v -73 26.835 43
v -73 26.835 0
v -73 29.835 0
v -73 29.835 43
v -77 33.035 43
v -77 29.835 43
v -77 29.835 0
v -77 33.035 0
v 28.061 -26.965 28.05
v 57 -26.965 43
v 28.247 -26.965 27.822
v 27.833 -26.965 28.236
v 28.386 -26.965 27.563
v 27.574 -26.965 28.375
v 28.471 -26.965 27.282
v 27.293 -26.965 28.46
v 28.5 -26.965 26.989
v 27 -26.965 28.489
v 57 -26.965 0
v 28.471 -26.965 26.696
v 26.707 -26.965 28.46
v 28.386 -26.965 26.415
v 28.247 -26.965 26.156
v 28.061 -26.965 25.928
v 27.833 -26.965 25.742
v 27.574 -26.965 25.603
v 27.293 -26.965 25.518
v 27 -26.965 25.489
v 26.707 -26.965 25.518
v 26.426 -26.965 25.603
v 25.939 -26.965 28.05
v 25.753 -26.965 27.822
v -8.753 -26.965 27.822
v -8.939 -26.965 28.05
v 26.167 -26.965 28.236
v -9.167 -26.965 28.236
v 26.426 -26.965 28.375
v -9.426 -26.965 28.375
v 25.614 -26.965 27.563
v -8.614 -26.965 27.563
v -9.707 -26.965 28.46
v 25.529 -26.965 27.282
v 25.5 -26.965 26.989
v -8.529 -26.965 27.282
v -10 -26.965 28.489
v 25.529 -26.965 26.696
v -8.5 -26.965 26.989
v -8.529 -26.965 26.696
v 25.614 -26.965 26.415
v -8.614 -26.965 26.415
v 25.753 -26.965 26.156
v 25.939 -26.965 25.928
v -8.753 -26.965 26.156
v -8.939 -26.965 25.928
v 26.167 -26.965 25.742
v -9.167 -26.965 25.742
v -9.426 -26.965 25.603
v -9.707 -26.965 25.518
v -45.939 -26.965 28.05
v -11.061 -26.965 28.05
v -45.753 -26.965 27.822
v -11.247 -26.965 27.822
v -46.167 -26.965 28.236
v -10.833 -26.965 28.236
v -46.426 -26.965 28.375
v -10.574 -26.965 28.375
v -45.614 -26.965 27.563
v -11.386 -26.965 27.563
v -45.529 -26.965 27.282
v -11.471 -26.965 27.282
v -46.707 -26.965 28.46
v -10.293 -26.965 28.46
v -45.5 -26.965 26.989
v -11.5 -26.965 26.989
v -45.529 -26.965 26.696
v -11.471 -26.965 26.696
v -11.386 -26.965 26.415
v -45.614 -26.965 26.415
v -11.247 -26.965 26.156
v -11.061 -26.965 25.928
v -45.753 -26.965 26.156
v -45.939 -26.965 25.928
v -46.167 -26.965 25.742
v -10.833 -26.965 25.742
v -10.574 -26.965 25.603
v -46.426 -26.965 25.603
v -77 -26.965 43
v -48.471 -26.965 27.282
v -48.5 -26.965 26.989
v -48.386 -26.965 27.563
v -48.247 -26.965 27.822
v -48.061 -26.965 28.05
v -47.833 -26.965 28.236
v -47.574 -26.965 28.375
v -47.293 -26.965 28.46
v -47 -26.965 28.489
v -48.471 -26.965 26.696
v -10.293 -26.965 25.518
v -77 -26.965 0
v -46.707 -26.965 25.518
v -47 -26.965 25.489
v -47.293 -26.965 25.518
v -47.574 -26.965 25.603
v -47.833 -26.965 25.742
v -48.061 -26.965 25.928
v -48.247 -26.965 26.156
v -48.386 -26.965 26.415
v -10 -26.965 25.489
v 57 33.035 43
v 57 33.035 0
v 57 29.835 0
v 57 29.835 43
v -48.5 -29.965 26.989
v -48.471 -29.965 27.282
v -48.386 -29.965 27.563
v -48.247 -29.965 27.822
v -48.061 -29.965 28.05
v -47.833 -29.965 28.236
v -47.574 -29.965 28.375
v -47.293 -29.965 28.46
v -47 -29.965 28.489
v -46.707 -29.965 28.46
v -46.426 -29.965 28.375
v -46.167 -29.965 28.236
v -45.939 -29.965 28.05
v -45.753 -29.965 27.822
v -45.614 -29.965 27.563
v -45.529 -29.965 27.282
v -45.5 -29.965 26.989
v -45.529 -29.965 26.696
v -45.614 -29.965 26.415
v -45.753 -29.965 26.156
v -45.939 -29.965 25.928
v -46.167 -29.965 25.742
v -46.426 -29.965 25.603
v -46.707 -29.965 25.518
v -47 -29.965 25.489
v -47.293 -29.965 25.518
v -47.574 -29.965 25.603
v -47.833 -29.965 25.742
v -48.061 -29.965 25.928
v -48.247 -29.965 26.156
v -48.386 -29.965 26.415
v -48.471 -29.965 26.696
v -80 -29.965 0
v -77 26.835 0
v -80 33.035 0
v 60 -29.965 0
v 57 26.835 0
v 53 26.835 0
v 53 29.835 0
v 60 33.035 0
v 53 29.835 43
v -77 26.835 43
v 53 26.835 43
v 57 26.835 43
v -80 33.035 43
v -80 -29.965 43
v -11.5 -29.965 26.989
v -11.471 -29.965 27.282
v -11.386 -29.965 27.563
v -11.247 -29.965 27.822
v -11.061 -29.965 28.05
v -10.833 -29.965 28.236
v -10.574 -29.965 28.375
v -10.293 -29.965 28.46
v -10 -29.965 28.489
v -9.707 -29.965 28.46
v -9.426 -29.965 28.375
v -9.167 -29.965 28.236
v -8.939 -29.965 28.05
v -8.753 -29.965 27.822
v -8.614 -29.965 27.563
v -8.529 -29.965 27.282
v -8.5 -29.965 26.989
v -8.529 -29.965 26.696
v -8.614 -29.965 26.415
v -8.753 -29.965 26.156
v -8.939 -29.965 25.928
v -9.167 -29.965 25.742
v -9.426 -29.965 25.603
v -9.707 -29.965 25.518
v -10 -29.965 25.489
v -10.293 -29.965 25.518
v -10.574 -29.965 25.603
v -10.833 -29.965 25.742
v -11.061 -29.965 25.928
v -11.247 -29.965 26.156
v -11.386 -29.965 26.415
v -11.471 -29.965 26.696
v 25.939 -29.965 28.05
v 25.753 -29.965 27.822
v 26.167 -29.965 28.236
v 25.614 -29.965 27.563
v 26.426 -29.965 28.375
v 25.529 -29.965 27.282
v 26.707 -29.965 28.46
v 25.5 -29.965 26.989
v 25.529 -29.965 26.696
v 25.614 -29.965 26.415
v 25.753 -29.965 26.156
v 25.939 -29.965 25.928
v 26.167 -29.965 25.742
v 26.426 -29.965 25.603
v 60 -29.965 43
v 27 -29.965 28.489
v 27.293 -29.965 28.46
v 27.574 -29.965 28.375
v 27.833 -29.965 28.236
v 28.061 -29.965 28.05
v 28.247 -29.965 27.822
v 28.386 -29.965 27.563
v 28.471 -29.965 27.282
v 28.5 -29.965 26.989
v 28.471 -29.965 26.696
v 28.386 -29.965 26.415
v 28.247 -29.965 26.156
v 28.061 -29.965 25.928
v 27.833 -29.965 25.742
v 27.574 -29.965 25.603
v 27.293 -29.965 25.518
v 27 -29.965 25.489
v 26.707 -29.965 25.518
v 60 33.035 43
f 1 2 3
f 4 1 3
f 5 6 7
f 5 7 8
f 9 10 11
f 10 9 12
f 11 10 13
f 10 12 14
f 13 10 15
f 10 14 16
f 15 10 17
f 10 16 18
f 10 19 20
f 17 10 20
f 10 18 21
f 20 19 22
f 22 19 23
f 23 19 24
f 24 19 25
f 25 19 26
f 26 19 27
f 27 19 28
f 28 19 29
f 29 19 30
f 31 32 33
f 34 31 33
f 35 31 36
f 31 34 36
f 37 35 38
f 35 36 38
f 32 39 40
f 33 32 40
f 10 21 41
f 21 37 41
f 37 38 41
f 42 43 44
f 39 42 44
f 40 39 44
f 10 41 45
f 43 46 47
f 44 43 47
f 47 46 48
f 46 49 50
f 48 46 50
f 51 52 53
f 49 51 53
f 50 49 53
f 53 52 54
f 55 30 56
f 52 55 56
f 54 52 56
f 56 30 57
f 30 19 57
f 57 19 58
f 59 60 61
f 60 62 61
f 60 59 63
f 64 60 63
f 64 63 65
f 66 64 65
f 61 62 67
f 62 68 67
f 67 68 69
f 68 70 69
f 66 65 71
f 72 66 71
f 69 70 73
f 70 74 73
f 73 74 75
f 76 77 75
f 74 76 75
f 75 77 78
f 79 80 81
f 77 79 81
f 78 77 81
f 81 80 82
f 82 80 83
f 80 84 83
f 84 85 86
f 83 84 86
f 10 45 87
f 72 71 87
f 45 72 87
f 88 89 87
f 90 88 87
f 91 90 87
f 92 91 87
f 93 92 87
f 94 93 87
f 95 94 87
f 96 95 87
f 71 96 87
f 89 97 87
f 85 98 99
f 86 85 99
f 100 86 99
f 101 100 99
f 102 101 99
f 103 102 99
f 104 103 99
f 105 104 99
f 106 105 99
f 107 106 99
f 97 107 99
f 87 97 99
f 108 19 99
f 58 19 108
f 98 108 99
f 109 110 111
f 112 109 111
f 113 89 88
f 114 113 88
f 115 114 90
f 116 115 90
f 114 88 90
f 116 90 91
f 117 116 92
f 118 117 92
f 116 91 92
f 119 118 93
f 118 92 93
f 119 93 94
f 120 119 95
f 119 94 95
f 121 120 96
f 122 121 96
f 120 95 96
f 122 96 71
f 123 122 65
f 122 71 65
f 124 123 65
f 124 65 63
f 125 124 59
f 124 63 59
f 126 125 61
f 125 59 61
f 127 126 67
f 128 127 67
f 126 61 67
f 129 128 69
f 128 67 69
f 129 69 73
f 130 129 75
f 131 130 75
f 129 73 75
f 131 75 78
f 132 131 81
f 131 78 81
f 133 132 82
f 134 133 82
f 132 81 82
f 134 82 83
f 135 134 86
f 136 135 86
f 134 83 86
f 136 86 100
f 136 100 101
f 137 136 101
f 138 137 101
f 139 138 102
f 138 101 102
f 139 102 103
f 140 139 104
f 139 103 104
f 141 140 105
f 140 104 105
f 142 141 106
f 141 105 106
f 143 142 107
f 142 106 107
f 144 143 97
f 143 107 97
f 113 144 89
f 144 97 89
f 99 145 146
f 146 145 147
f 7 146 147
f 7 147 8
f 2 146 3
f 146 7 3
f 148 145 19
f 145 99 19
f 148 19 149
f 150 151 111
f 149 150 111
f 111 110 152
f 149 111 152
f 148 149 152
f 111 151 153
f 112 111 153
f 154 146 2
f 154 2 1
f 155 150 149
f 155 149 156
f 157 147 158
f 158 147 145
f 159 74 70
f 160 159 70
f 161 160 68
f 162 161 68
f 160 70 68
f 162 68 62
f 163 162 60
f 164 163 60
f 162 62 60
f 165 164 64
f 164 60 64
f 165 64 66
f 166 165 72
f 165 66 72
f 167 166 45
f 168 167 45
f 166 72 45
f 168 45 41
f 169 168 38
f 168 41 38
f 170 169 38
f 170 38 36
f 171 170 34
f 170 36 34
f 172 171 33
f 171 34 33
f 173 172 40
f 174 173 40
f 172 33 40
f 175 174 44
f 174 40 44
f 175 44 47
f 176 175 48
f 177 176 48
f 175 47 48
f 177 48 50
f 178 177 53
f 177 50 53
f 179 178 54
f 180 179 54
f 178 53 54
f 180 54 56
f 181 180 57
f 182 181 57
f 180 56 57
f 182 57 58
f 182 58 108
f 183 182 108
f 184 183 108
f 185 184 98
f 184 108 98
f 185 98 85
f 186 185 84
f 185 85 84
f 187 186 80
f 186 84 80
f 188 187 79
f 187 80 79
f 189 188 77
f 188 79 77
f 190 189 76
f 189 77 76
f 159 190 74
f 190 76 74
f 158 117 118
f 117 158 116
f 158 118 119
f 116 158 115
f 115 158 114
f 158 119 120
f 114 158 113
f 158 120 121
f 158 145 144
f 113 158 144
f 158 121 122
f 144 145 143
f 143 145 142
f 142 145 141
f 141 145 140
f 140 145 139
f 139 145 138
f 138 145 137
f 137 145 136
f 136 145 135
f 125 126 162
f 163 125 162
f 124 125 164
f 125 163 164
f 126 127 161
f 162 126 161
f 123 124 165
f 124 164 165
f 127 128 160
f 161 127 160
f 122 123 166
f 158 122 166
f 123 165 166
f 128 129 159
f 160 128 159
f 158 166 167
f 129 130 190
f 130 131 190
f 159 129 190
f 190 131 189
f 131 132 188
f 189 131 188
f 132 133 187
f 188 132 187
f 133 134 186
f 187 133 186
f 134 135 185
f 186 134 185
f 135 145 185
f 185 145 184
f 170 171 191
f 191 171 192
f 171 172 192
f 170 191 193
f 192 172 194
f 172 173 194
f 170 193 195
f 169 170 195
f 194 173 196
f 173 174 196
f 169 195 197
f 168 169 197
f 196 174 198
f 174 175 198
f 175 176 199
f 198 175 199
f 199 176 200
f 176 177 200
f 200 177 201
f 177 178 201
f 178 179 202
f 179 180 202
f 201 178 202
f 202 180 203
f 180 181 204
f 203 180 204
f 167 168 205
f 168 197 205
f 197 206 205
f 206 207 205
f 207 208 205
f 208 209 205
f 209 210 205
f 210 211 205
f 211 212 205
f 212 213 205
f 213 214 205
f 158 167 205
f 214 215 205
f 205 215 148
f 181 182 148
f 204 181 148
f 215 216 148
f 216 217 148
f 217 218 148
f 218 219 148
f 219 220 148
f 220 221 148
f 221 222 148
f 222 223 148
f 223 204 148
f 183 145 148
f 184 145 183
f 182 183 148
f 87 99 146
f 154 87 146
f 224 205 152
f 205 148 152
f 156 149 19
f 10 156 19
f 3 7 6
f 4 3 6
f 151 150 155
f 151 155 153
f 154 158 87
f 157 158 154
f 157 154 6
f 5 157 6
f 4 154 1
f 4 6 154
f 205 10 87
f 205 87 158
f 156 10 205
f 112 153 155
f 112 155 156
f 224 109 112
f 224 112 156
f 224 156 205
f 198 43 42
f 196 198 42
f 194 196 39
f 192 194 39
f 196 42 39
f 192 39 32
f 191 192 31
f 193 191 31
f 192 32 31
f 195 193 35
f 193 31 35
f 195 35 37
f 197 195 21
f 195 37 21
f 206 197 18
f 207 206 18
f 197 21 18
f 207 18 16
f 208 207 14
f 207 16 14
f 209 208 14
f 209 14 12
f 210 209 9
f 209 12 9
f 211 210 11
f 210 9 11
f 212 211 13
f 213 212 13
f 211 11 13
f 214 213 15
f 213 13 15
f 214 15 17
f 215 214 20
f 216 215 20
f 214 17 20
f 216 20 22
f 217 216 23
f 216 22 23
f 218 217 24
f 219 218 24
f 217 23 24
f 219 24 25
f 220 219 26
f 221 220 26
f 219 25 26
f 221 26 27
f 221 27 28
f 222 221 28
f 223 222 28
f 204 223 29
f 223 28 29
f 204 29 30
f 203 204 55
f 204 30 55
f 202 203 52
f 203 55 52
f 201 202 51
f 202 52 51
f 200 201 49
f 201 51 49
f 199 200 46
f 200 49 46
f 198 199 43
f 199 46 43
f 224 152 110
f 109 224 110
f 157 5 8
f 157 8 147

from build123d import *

# Parameters (mm, degrees)
F0_R      = 8
F1_DEPTH  = 3
F2_W      = 3
F2_H      = 3
F2_W_2    = 134
F3_DEPTH  = 40
F4_W      = 3
F4_H      = 40
F5_DEPTH  = 134
F6_W      = 126
F6_H      = 3
F7_DEPTH  = 40
F8_R      = 1.5
F9_DEPTH  = 3
F10_R     = 8
F12_DEPTH = 40


with BuildPart() as f1:
    # F0 (on Top) → F1 (new body)
    with BuildSketch(Plane.XY):
        Polygon((-60, 33.034884), (-80, 33.034884), (-80, 18.034884), (-80, 0.034884), (-80, -2.965116), (-80, -17.965116), (-80, -29.965116), (60, -29.965116), (60, -24.965116), (60, -14.965116), (60, -9.965116), (60, -4.965116), (60, 0.034884), (60, 18.034884), (60, 33.034884), (40, 33.034884), (20, 33.034884), (0, 33.034884), (-20, 33.034884), (-40, 33.034884), align=None)
        with Locations((25, -0.468963)):
            Circle(F0_R, mode=Mode.SUBTRACT)
        with Locations((-45, 1.034884)):
            Circle(F0_R, mode=Mode.SUBTRACT)
    extrude(amount=F1_DEPTH)

    # F2 (on face) → F3 (join)
    with BuildSketch(Plane.XY.offset(3)):
        with Locations((-78.5, -28.465116)):
            Rectangle(F2_W, F2_H)
        with Locations((-10, -28.465116)):
            Rectangle(F2_W_2, F2_H)
        Polygon((-80, 30.034884), (-80, -26.965116), (-77, -26.965116), (-77, 33.034884), (-80, 33.034884), align=None)
        with Locations((58.5, -28.465116)):
            Rectangle(F2_W, F2_H)
        Polygon((57, 33.034884), (57, -26.965116), (60, -26.965116), (60, 30.034884), (60, 33.034884), align=None)
    extrude(amount=F3_DEPTH)

    # F4 (on face) → F5 (join)
    with BuildSketch(Plane.YZ.offset(-77)):
        with Locations((28.334884, 23)):
            Rectangle(F4_W, F4_H)
    extrude(amount=F5_DEPTH)

    # F6 (on face) → F7 (cut)
    with BuildSketch(Plane.XY.offset(43)):
        with Locations((-10, 28.334884)):
            Rectangle(F6_W, F6_H)
    extrude(amount=-F7_DEPTH, mode=Mode.SUBTRACT)

    # F8 (on face) → F9 (cut)
    with BuildSketch(Plane(origin=(0, -26.965116, 0), x_dir=(-1, 0, 0), z_dir=(0, 1, 0))):
        with Locations((47, 26.988985)):
            Circle(F8_R)
        with Locations((-27, 26.988985)):
            Circle(F8_R)
        with Locations((10, 26.988985)):
            Circle(F8_R)
    extrude(amount=-F9_DEPTH, mode=Mode.SUBTRACT)

    # F10 (on face) → F12 (cut)
    with BuildSketch(Plane.XY.offset(3)):
        Polygon((57, 29.834884), (57, 33.034884), (-77, 33.034884), (-77, 29.834884), (-73, 29.834884), (-73, 26.834884), (-77, 26.834884), (-77, -26.965116), (57, -26.965116), (57, 26.834884), (53, 26.834884), (53, 29.834884), align=None)
        with Locations((-45, 1.034884)):
            Circle(F10_R, mode=Mode.SUBTRACT)
        with Locations((25, -0.468963)):
            Circle(F10_R, mode=Mode.SUBTRACT)
    extrude(amount=-F12_DEPTH, mode=Mode.SUBTRACT)


solid = f1.part
